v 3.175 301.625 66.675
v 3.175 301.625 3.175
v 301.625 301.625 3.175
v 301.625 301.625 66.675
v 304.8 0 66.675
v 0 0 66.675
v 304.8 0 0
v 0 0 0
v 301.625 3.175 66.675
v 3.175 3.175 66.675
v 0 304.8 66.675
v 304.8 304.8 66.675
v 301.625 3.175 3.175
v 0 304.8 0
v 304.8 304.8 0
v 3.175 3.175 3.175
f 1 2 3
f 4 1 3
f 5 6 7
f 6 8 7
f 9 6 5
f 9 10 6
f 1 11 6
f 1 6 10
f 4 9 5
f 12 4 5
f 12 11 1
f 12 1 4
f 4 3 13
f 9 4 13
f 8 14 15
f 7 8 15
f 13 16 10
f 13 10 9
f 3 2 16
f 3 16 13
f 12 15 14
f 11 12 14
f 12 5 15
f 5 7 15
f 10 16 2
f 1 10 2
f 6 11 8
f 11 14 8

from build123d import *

# Parameters (mm, degrees)
SKETCH1_W           = 304.8
SKETCH1_H           = 304.8
BOSS_EXTRUDE1_DEPTH = 3.175
SKETCH2_W           = 298.45
SKETCH2_H           = 3.175
BOSS_EXTRUDE2_DEPTH = 63.5


with BuildPart() as part:
    # Sketch1 → Boss-Extrude1 (new body)
    with BuildSketch(Plane.XY):
        with Locations((152.4, 152.4)):
            Rectangle(SKETCH1_W, SKETCH1_H)
    extrude(amount=BOSS_EXTRUDE1_DEPTH)

    # Sketch2 → Boss-Extrude2 (add)
    with BuildSketch(Plane.XY.offset(3.175)):
        with Locations((152.4, 1.5875)):
            Rectangle(SKETCH2_W, SKETCH2_H)
        Polygon((3.175, 301.625), (0, 301.625), (0, 0), (3.175, 0), (3.175, 3.175), align=None)
        Polygon((304.8, 301.625), (304.8, 304.8), (0, 304.8), (0, 301.625), (3.175, 301.625), (301.625, 301.625), align=None)
        Polygon((304.8, 0), (304.8, 301.625), (301.625, 301.625), (301.625, 3.175), (301.625, 0), align=None)
    extrude(amount=BOSS_EXTRUDE2_DEPTH)


solid = part.part
